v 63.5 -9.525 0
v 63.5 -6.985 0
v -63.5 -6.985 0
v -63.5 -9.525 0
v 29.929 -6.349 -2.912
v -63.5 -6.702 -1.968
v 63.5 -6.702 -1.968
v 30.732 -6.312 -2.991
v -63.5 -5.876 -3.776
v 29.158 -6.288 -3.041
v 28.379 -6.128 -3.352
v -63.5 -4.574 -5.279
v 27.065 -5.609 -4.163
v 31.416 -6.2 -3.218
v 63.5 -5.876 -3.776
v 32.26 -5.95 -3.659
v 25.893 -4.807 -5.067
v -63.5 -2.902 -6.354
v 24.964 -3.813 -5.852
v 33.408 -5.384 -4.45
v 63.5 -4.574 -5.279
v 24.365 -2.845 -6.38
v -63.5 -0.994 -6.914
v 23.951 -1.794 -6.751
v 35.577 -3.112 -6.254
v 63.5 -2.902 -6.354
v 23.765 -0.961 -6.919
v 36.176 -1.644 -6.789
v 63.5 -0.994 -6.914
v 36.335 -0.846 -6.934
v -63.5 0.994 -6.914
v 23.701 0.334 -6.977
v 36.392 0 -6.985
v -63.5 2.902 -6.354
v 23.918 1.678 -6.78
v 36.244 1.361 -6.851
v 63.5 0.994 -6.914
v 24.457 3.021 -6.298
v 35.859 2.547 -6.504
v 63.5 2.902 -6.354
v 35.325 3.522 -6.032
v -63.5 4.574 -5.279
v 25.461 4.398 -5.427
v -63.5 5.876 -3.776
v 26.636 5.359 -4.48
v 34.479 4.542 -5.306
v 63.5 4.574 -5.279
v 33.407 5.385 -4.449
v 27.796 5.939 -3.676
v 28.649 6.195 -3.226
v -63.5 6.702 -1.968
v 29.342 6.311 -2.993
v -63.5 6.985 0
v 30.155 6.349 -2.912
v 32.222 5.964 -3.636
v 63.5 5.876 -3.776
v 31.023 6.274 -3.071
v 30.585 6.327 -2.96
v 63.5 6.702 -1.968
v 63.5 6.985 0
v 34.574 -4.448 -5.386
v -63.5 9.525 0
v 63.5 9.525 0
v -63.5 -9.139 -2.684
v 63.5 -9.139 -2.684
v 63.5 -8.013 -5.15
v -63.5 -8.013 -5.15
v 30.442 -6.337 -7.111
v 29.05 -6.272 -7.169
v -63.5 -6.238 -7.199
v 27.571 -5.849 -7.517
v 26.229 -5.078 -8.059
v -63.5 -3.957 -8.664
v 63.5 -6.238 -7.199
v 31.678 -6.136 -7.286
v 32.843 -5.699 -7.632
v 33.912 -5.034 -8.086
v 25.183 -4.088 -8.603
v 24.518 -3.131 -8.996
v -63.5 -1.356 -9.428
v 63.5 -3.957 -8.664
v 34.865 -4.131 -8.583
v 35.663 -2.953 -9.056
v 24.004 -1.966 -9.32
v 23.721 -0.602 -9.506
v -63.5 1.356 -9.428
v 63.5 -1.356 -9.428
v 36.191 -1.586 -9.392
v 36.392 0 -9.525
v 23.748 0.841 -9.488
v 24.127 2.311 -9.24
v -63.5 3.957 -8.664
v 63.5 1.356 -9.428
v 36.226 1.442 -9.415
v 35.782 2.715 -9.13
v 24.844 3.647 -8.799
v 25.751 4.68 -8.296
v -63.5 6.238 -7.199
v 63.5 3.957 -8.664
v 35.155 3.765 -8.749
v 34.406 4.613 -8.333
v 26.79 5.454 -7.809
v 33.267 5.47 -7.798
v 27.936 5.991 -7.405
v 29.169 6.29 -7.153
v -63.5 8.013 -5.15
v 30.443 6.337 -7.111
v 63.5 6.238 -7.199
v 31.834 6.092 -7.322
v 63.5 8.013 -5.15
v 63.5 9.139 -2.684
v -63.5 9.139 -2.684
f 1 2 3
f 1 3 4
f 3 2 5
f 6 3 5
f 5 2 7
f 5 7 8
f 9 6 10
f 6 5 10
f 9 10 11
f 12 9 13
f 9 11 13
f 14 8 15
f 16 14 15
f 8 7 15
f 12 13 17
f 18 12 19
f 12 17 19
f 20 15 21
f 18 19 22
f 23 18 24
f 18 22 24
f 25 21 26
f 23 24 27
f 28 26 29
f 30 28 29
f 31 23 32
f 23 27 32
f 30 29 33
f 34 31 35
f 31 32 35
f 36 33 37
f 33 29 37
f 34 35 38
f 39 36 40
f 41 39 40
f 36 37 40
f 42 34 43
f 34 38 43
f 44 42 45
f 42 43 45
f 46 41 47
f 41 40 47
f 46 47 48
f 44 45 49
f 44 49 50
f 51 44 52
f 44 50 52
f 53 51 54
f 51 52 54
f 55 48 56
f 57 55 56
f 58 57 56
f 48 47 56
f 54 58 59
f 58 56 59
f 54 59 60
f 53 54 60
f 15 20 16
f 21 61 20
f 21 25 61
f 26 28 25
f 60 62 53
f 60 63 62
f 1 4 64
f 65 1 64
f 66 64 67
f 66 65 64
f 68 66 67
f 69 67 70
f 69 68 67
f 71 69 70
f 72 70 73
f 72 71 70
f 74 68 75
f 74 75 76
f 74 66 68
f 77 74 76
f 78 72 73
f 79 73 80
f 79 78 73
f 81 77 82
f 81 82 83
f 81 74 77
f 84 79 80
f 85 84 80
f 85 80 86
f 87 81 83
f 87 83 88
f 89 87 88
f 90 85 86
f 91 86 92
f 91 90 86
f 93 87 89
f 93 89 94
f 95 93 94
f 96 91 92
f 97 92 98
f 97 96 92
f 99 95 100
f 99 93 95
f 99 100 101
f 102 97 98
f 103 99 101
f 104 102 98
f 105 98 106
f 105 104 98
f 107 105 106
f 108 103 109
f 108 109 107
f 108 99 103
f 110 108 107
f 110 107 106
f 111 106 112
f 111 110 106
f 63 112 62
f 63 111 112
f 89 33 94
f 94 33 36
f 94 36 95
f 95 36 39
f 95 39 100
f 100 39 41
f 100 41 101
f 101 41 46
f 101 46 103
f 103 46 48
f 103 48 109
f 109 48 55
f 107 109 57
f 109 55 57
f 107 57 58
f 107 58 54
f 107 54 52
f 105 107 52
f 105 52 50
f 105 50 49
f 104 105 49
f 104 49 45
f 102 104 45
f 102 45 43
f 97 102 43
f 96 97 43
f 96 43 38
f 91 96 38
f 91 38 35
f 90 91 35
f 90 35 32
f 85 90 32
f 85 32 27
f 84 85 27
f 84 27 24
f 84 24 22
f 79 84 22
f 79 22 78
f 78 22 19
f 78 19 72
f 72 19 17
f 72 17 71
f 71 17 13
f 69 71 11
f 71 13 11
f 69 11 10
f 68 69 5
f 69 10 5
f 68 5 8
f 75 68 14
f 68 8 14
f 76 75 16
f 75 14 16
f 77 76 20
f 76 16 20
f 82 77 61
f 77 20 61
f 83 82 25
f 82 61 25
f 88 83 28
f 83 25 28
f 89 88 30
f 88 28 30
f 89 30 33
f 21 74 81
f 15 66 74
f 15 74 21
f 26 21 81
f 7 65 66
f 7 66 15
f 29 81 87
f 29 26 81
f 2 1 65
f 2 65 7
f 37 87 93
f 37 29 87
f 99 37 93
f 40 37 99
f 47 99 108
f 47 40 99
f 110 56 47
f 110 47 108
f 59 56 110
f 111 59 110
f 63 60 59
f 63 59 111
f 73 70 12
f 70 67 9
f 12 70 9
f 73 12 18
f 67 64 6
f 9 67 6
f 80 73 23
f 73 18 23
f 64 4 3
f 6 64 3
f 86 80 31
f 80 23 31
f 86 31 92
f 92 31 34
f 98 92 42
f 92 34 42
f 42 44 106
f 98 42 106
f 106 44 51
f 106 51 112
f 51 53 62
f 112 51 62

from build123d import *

# Parameters (mm, degrees)
F1_DEPTH = 63.5
F2_T     = -2.54
F3_R     = 6.35
F4_DEPTH = 25.4


with BuildPart() as f1:
    # F0 (on Right) → F1 (new body, symmetric)
    with BuildSketch(Plane.YZ):
        with BuildLine():
            Line((9.525, 0), (-9.525, 0))
            ThreePointArc((-9.525, 0), (0, -9.525), (9.525, 0))
        make_face()
    extrude(amount=F1_DEPTH, both=True)

    # F2
    f2_openings = [f1.faces().sort_by_distance(p)[0] for p in [
        (-63.5, 0, -4.042536),
        (0, 0, 0),
        (63.5, 0, -4.042536),
    ]]
    offset(amount=F2_T, openings=f2_openings)

    # F3 (on Top) → F4 (cut)
    with BuildSketch(Plane.XY):
        with Locations((30.042015313, 0)):
            Circle(F3_R)
    extrude(amount=-F4_DEPTH, mode=Mode.SUBTRACT)


solid = f1.part
